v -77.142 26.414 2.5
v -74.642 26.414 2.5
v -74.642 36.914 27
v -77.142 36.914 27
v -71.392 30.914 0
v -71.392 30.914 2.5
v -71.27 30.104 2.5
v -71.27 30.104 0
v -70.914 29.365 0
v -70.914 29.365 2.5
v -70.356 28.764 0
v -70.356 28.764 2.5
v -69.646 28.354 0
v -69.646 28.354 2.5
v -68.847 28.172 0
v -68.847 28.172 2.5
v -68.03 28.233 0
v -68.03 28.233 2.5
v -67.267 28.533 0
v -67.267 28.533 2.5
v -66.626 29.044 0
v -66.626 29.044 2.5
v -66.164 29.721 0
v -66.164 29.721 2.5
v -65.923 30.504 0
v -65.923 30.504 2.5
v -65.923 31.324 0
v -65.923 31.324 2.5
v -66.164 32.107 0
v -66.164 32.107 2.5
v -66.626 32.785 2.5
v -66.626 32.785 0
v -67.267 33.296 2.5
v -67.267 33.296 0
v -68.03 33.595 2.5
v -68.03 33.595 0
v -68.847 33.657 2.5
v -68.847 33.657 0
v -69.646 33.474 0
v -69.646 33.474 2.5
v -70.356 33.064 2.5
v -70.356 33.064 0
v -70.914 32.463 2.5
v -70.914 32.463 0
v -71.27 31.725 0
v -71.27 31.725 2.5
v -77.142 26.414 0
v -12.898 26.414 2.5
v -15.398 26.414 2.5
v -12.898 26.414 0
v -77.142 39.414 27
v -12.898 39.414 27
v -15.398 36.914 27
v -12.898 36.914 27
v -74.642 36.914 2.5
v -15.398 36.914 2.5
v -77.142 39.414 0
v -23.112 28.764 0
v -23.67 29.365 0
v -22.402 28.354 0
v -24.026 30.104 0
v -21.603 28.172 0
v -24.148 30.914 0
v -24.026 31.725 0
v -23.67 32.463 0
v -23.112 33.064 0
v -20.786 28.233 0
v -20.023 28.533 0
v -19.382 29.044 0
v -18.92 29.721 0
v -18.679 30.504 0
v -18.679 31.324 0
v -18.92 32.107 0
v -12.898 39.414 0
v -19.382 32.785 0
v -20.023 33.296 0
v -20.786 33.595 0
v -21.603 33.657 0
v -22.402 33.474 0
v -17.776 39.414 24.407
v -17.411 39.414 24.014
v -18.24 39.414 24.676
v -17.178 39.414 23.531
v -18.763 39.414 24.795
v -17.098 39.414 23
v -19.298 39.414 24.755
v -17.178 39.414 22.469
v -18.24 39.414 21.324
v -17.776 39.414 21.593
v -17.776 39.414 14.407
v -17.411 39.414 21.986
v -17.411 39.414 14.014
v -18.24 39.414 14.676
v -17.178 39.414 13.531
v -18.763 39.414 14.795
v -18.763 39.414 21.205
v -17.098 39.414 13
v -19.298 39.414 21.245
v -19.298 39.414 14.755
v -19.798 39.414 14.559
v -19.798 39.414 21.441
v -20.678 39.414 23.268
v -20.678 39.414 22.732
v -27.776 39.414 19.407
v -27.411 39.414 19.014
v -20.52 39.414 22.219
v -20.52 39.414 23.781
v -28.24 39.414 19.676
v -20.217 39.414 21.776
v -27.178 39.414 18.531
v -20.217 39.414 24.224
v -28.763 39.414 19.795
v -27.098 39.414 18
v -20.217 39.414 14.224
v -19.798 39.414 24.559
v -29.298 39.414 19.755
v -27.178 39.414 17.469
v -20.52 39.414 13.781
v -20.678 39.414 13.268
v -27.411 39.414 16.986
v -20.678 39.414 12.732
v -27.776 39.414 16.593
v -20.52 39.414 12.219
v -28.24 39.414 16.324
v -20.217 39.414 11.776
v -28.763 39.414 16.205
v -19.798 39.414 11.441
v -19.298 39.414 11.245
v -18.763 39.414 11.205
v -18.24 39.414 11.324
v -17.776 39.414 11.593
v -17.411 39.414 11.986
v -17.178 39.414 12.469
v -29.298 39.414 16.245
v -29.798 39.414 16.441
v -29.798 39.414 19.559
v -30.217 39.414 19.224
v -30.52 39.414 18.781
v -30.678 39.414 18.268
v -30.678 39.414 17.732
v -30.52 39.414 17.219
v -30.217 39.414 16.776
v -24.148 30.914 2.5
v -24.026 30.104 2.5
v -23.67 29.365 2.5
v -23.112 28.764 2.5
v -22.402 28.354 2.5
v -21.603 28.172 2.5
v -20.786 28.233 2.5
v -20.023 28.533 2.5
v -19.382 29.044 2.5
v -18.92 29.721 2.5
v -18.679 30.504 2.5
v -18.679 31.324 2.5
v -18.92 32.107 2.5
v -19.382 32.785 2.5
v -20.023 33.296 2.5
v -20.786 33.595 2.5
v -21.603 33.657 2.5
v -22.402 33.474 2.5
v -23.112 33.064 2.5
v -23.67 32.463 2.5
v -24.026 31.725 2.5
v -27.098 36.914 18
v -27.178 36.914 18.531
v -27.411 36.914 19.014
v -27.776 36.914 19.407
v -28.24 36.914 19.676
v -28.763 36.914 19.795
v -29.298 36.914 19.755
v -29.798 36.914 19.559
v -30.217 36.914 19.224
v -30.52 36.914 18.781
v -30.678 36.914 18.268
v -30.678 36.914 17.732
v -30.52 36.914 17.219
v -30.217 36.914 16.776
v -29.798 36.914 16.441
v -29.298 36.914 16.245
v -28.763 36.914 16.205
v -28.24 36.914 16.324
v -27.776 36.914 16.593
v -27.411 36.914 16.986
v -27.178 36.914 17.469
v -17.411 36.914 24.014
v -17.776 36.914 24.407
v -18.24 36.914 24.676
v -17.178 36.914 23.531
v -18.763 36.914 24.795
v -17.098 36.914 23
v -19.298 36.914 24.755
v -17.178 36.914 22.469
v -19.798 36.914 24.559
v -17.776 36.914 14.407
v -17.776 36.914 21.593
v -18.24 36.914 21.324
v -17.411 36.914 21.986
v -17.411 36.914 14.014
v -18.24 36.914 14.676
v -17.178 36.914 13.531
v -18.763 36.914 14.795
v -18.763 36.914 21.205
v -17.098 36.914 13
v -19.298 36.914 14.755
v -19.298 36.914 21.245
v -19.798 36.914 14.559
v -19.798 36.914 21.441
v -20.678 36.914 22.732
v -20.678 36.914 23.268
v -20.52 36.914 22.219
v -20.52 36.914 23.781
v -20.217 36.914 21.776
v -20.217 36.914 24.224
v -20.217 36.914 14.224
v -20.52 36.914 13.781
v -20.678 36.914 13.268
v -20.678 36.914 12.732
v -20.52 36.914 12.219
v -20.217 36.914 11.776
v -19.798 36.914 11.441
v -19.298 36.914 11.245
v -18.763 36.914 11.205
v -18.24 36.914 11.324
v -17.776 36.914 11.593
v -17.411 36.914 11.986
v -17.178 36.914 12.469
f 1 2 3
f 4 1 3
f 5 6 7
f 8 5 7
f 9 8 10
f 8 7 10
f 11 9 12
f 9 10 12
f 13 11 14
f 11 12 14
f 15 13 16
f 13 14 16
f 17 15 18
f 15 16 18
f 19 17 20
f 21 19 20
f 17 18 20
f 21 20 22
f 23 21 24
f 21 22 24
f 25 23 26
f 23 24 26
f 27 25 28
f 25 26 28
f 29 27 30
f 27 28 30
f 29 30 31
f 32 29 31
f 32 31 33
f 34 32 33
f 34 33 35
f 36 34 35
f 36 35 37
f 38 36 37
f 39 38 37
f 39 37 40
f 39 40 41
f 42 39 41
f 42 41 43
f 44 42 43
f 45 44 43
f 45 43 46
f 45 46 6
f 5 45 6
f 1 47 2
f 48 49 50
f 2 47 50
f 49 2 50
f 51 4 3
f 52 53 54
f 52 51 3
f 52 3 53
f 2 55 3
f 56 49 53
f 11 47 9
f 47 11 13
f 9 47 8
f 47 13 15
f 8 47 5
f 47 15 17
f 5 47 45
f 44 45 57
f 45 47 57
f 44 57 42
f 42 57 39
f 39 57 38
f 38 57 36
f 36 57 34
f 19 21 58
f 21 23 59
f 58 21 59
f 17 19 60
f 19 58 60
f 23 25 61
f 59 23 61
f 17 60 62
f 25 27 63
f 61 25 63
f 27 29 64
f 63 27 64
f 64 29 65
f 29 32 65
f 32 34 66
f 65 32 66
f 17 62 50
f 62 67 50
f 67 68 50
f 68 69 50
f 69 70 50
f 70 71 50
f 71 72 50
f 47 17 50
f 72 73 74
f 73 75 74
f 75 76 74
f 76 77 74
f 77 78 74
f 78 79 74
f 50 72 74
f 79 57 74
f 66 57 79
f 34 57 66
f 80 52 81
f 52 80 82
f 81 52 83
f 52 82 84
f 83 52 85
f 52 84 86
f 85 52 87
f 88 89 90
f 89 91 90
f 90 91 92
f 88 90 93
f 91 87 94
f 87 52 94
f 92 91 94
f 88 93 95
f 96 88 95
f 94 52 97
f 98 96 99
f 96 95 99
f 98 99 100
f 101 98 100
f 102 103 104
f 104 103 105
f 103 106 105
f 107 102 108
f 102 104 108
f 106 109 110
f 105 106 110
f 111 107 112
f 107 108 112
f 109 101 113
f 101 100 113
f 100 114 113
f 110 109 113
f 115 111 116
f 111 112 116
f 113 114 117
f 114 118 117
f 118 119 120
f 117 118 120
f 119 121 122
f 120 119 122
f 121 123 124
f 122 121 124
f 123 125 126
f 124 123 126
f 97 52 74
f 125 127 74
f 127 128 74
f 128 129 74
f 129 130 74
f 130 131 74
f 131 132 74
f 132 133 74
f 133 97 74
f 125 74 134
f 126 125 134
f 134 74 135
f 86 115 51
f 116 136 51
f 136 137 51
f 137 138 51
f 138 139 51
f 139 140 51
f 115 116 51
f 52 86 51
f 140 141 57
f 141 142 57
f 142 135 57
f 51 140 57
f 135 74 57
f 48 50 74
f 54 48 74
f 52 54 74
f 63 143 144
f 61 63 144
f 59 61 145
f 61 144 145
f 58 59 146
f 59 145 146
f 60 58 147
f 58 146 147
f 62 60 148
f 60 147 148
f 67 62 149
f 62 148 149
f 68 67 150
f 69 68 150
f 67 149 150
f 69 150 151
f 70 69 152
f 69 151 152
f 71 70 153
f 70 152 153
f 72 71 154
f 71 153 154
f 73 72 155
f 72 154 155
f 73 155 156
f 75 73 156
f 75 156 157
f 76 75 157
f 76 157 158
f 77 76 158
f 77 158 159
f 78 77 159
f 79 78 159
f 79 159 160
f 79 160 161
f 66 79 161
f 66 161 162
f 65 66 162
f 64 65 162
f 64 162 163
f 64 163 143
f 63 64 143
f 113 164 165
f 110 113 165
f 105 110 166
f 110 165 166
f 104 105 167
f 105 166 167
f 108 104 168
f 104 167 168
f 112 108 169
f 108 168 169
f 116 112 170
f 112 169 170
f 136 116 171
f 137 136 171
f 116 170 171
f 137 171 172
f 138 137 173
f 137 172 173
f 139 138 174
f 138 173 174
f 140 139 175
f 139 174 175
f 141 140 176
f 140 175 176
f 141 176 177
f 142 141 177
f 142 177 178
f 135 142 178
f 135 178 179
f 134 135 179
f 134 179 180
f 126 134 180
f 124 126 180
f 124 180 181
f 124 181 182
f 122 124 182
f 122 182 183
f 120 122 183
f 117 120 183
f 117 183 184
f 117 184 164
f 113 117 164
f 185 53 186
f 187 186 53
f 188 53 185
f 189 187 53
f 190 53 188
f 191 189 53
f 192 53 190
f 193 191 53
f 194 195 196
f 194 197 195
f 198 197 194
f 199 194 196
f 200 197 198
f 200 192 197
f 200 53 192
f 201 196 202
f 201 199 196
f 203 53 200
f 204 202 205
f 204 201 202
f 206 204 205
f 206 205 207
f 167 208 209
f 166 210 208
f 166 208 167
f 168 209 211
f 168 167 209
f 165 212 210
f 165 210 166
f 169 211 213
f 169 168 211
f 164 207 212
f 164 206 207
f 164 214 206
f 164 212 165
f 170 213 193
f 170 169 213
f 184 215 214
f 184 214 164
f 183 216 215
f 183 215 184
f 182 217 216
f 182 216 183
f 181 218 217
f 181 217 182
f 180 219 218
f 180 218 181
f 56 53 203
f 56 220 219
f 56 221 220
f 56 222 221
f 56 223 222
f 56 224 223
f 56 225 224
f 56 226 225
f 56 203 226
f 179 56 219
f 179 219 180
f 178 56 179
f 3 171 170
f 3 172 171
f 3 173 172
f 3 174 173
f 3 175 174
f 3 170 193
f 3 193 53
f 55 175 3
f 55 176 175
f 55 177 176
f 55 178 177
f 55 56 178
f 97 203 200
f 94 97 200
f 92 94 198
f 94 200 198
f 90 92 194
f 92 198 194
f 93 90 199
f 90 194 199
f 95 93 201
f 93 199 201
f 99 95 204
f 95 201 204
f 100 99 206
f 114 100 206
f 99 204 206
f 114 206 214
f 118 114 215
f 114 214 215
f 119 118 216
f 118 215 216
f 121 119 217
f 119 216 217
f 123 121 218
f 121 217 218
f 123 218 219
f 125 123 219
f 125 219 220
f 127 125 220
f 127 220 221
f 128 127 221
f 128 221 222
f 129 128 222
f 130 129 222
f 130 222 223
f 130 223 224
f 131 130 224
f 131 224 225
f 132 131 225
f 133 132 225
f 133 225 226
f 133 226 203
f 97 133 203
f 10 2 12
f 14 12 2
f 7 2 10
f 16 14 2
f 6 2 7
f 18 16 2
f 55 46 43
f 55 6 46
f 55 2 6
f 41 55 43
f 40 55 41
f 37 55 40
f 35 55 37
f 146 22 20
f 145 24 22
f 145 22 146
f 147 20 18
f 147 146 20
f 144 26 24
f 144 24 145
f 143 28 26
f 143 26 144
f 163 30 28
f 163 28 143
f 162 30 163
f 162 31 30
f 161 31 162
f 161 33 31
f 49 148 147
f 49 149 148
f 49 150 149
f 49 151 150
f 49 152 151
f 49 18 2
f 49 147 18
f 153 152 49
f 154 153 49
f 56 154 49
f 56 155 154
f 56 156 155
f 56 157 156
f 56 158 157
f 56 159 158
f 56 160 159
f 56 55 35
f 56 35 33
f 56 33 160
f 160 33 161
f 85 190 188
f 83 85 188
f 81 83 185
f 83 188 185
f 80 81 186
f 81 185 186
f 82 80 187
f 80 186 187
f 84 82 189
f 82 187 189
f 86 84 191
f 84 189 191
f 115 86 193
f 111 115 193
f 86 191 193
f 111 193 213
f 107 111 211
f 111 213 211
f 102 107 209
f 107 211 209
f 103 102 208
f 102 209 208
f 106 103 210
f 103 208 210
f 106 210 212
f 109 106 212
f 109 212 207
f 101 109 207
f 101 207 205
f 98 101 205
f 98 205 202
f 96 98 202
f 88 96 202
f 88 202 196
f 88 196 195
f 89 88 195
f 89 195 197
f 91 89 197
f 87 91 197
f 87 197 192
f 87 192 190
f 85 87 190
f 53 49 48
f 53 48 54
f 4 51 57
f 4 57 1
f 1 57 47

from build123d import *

# Parameters (mm, degrees)
F0_R          = 2.5
F1_DEPTH      = 27
F2_T          = -2.5
F4_DEPTH      = 2.501
F4_DEPTH_BACK = 61.745
F6_D          = 5.5
F7_D          = 3.6


with BuildPart() as f1:
    # F0 (on Top) → F1 (new body)
    with BuildSketch(Plane.XY):
        Polygon((-77.141795, 26.4142), (-45.019795, 26.4142), (-12.897795, 26.4142), (-12.897795, 39.4142), (-77.141795, 39.4142), align=None)
        with Locations((-68.641795, 30.9142)):
            Circle(F0_R, mode=Mode.SUBTRACT)
        with Locations((-21.397795, 30.9142)):
            Circle(F0_R, mode=Mode.SUBTRACT)
        with Locations((-68.641795, 30.9142)):
            Circle(F0_R)
        with Locations((-21.397795, 30.9142)):
            Circle(F0_R)
    extrude(amount=F1_DEPTH)

    # F2
    f2_openings = [f1.faces().sort_by_distance(p)[0] for p in [
        (-45.019795, 32.9142, 27),
        (-45.019795, 26.4142, 13.5),
    ]]
    offset(amount=F2_T, openings=f2_openings)

    # F3 (on face) → F4 (cut, two sides)
    with BuildSketch(Plane.YZ.offset(-74.641795)) as f4_sk:
        Polygon((26.4142, 27), (26.4142, 2.5), (36.9142, 27), align=None)
    extrude(amount=-F4_DEPTH, mode=Mode.SUBTRACT)
    extrude(f4_sk.sketch, amount=F4_DEPTH_BACK, mode=Mode.SUBTRACT)

    # F6 (through all)
    with Locations(Plane(origin=(0, 0, 0), x_dir=(1, 0, 0), z_dir=(0, 0, -1))):
        with Locations((-68.641795, -30.9142), (-21.397795, -30.9142)):
            Hole(F6_D / 2)

    # F7 (through all)
    with Locations(Plane(origin=(0, 39.4142, 0), x_dir=(-1, 0, 0), z_dir=(0, 1, 0))):
        with Locations((18.897795, 13), (18.897795, 23), (28.897795, 18)):
            Hole(F7_D / 2)


solid = f1.part
